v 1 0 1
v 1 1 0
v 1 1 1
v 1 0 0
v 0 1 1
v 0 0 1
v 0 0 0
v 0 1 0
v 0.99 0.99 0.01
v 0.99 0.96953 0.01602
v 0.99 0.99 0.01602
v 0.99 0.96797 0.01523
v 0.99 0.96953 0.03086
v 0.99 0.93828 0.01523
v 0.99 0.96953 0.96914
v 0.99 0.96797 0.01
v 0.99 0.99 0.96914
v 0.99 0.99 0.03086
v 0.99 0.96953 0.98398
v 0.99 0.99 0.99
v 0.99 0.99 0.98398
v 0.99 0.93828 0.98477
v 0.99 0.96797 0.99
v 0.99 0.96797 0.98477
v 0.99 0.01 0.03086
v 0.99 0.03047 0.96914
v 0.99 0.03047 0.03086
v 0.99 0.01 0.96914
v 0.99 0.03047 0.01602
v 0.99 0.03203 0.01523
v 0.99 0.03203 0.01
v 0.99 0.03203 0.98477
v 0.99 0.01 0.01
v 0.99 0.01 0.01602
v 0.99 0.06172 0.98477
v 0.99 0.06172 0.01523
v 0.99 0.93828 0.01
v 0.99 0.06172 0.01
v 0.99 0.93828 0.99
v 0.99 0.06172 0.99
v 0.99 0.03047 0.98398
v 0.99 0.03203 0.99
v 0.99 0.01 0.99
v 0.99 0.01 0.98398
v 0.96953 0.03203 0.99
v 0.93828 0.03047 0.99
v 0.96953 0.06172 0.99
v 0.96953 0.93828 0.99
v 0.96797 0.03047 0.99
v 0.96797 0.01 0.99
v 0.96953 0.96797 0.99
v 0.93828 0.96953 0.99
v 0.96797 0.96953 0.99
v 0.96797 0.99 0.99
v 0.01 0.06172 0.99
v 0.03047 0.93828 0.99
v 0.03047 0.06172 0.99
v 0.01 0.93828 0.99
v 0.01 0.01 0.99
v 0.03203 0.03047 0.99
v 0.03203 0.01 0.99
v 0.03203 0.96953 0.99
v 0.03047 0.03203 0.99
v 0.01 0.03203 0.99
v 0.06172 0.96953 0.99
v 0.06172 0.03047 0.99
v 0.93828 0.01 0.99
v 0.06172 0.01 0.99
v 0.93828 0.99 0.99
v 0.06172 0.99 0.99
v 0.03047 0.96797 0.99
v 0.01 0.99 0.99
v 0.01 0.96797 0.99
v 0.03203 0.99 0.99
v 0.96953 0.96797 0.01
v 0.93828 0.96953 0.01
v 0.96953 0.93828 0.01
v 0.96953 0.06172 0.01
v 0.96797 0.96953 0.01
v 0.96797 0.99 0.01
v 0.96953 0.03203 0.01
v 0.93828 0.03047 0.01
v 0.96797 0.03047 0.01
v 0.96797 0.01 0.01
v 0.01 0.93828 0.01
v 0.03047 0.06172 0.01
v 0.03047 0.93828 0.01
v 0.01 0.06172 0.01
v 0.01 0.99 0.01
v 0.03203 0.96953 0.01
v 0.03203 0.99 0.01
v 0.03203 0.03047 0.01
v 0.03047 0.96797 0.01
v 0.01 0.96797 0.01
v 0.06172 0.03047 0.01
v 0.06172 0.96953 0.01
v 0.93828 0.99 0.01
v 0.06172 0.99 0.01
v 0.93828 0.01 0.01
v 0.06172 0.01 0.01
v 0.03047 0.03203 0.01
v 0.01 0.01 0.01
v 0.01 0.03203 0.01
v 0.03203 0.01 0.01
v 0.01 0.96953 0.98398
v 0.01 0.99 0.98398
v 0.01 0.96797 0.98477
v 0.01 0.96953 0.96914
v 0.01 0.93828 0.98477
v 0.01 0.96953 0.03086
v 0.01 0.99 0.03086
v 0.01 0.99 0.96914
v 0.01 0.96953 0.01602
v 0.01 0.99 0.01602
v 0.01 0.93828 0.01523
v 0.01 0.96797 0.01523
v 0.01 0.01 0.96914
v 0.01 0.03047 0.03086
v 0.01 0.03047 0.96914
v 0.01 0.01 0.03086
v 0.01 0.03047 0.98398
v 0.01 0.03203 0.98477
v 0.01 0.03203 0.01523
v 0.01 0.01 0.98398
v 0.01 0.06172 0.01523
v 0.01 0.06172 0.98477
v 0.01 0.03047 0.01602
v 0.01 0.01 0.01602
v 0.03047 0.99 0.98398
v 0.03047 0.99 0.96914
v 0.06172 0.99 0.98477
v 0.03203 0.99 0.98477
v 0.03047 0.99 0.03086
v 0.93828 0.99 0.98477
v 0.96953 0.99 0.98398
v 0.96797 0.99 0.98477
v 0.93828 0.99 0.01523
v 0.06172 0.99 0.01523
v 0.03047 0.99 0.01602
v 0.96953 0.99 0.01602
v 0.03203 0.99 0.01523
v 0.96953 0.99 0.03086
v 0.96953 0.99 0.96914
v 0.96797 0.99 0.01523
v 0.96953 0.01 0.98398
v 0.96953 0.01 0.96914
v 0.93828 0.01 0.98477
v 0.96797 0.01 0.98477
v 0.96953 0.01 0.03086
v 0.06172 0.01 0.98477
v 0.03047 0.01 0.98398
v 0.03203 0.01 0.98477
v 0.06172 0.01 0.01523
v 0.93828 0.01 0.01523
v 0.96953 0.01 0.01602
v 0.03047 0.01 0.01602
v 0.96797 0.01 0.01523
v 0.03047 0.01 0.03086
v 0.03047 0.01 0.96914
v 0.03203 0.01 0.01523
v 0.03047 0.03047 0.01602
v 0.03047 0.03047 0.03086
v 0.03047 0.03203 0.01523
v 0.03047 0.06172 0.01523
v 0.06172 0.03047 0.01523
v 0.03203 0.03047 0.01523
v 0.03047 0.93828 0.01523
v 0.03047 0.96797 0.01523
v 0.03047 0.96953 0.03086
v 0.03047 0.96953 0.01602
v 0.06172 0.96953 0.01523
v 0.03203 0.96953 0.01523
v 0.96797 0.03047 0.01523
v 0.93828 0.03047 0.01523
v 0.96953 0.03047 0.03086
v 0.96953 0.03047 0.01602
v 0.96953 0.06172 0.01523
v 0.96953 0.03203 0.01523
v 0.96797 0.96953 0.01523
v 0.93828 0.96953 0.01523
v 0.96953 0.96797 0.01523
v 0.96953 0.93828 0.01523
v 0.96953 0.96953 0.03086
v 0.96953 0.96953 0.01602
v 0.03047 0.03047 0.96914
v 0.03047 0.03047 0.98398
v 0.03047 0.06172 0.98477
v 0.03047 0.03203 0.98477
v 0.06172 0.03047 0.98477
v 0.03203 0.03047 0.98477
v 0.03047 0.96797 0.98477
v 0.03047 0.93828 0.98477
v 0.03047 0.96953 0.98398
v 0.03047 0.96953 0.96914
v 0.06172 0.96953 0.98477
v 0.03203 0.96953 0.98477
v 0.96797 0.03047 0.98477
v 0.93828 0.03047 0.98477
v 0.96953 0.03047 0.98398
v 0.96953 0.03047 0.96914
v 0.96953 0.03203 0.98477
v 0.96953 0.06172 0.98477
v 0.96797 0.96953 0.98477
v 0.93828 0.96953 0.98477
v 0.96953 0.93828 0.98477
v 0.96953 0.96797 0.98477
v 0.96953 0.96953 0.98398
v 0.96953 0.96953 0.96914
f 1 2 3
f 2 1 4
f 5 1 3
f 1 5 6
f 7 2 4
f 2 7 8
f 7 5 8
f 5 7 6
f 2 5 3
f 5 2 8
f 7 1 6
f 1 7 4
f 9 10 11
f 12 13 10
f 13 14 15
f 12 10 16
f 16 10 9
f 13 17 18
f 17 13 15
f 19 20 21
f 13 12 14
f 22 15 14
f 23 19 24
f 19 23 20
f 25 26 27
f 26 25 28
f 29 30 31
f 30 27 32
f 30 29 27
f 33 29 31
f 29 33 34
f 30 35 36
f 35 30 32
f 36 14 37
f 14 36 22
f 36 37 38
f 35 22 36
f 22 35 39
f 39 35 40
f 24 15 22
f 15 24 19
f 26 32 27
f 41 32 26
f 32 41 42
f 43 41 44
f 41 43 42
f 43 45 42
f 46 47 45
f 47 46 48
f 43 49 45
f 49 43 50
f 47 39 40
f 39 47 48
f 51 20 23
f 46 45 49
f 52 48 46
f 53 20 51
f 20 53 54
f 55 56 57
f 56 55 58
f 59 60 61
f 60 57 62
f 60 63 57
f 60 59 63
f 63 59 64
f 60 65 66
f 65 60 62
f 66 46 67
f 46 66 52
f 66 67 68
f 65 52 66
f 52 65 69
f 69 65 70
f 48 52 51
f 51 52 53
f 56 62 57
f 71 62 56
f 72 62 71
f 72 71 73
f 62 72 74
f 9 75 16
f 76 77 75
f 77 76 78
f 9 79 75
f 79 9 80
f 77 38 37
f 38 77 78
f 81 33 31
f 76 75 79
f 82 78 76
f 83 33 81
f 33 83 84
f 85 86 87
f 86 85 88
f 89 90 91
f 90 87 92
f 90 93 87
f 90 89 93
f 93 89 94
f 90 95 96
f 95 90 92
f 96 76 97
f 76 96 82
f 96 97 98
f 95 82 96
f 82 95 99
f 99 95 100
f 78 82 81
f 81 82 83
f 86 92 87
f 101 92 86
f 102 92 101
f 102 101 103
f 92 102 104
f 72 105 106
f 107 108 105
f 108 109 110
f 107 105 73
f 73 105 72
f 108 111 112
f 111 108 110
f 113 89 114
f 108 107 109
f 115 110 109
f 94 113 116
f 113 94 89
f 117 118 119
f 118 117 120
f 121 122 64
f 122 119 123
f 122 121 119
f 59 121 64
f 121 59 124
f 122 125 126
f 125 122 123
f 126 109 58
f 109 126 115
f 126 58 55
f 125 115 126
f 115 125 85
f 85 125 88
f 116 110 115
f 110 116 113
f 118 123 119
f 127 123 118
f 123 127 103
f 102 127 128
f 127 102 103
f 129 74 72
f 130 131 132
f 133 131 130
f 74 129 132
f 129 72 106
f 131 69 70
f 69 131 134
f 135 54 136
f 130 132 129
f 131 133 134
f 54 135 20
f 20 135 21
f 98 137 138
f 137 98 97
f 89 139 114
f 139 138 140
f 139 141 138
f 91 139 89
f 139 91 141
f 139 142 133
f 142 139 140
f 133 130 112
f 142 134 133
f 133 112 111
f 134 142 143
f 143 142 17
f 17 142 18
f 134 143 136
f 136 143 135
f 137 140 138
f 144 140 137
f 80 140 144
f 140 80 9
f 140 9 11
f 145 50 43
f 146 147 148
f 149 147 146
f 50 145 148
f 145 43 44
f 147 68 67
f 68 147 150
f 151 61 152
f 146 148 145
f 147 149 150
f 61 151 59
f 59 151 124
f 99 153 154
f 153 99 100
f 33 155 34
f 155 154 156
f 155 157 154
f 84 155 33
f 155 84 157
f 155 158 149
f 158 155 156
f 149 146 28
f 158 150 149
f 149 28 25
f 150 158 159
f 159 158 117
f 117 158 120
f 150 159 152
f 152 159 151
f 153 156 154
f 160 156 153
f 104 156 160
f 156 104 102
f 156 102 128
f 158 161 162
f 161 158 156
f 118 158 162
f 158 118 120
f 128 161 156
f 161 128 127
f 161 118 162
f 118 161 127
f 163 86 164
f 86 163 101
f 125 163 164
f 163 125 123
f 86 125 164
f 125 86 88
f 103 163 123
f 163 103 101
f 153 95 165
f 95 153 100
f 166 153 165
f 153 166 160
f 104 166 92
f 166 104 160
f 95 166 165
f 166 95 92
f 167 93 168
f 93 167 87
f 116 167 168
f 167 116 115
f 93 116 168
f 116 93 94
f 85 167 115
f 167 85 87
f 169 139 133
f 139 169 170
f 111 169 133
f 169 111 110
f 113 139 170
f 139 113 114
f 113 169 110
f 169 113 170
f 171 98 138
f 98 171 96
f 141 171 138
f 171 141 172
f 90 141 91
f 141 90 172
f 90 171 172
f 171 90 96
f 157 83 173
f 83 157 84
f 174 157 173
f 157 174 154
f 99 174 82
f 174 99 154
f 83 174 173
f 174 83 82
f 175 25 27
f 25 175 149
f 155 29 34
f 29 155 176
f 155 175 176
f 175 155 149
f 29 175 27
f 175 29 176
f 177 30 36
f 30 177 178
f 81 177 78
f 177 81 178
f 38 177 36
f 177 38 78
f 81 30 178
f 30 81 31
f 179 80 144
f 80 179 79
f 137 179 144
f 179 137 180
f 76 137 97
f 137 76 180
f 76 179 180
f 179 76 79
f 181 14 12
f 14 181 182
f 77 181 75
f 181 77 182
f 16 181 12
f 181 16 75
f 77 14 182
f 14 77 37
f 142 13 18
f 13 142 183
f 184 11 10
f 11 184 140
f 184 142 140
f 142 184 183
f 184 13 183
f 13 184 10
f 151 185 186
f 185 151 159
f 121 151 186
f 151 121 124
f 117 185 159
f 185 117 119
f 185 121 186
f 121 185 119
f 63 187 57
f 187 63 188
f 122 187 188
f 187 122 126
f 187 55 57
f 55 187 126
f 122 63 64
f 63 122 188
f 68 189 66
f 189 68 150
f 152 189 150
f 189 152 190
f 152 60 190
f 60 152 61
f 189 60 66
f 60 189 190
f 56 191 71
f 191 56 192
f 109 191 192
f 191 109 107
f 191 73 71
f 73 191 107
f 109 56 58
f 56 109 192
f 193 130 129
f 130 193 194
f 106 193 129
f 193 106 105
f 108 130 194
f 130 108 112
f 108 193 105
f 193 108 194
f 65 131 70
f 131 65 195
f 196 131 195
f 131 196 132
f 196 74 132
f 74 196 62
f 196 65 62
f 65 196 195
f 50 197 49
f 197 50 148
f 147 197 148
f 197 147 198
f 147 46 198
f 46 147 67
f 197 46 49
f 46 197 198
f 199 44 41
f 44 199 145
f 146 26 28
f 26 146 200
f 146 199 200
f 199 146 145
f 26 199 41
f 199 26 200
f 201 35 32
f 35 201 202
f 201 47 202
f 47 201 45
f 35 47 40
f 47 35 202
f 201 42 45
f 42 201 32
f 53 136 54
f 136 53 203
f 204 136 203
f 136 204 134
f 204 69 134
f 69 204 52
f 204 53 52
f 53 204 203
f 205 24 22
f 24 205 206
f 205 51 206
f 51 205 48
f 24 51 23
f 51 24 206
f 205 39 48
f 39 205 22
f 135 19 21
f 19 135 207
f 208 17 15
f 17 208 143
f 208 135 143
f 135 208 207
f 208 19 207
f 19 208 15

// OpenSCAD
translate([0.015625, 0.015625, 0.0234375]) color([0.9529501353459945, 0.4257794459656884, 0.031192825884839515]) cube([0.0296875, 0.0296875, 0.01484375], center=true);
translate([0.015625, 0.046875, 0.0078125]) color([0.49224294565020243, 0.28179459730619727, 0.7342665608910384]) cube([0.0296875, 0.0296875, 0.01484375], center=true);
translate([0.046875, 0.015625, 0.0078125]) color([0.7626727691516175, 0.8899742189354138, 0.5486404035697269]) cube([0.0296875, 0.0296875, 0.01484375], center=true);
translate([0.015625, 0.953125, 0.0078125]) color([0.7671805076483915, 0.6121861737886979, 0.40435887819181315]) cube([0.0296875, 0.0296875, 0.01484375], center=true);
translate([0.015625, 0.984375, 0.0234375]) color([0.27641070625592756, 0.32508662163924684, 0.2793020411138708]) cube([0.0296875, 0.0296875, 0.01484375], center=true);
translate([0.046875, 0.984375, 0.0078125]) color([0.3036325261711321, 0.12516363598825098, 0.8706740879432517]) cube([0.0296875, 0.0296875, 0.01484375], center=true);
translate([0.953125, 0.015625, 0.0078125]) color([0.9778055059540787, 0.9380432467905317, 0.4875084288926418]) cube([0.0296875, 0.0296875, 0.01484375], center=true);
translate([0.984375, 0.015625, 0.0234375]) color([0.491337367161355, 0.815223965662181, 0.2850245734476238]) cube([0.0296875, 0.0296875, 0.01484375], center=true);
translate([0.984375, 0.046875, 0.0078125]) color([0.6704048963284681, 0.8749445737887569, 0.9225621091062656]) cube([0.0296875, 0.0296875, 0.01484375], center=true);
translate([0.953125, 0.984375, 0.0078125]) color([0.32650592014424495, 0.9267679289247295, 0.9392976353444438]) cube([0.0296875, 0.0296875, 0.01484375], center=true);
translate([0.984375, 0.953125, 0.0078125]) color([0.10469860556095523, 0.18812002457720967, 0.5206904426516611]) cube([0.0296875, 0.0296875, 0.01484375], center=true);
translate([0.984375, 0.984375, 0.0234375]) color([0.9250412107491064, 0.9300014994388205, 0.17453235594062988]) cube([0.0296875, 0.0296875, 0.01484375], center=true);
translate([0.015625, 0.015625, 0.9765625]) color([0.7305892977478141, 0.10392415719854187, 0.08826484997882134]) cube([0.0296875, 0.0296875, 0.01484375], center=true);
translate([0.015625, 0.046875, 0.9921875]) color([0.3417687114400708, 0.03527522146440143, 0.25254475869300597]) cube([0.0296875, 0.0296875, 0.01484375], center=true);
translate([0.046875, 0.015625, 0.9921875]) color([0.7394935189779719, 0.8655911651110135, 0.6969416896970619]) cube([0.0296875, 0.0296875, 0.01484375], center=true);
translate([0.015625, 0.953125, 0.9921875]) color([0.3526130292594223, 0.8691323696171844, 0.2020132852309806]) cube([0.0296875, 0.0296875, 0.01484375], center=true);
translate([0.015625, 0.984375, 0.9765625]) color([0.9689052850282494, 0.341937751645613, 0.31095971721102034]) cube([0.0296875, 0.0296875, 0.01484375], center=true);
translate([0.046875, 0.984375, 0.9921875]) color([0.606331596350091, 0.5638715169289779, 0.6821550915760055]) cube([0.0296875, 0.0296875, 0.01484375], center=true);
translate([0.953125, 0.015625, 0.9921875]) color([0.4082276350397991, 0.8742223240372553, 0.3540626401036049]) cube([0.0296875, 0.0296875, 0.01484375], center=true);
translate([0.984375, 0.015625, 0.9765625]) color([0.4864439318669388, 0.7267610567114519, 0.17226198546807925]) cube([0.0296875, 0.0296875, 0.01484375], center=true);
translate([0.984375, 0.046875, 0.9921875]) color([0.5917058516267724, 0.21068341757105835, 0.8879076773151368]) cube([0.0296875, 0.0296875, 0.01484375], center=true);
translate([0.953125, 0.984375, 0.9921875]) color([0.07934250488153727, 0.35071163644577374, 0.8793032078941269]) cube([0.0296875, 0.0296875, 0.01484375], center=true);
translate([0.984375, 0.953125, 0.9921875]) color([0.24478782051465153, 0.7255438646626325, 0.6894029863329633]) cube([0.0296875, 0.0296875, 0.01484375], center=true);
translate([0.984375, 0.984375, 0.9765625]) color([0.6241975238236468, 0.7365438178391559, 0.2126760943996696]) cube([0.0296875, 0.0296875, 0.01484375], center=true);
color([0.3,0.3,0.3,0.3]) difference() { cube([1,1,1]); translate([0.01,0.01,0.01]) cube([0.98,0.98,0.98]); }
